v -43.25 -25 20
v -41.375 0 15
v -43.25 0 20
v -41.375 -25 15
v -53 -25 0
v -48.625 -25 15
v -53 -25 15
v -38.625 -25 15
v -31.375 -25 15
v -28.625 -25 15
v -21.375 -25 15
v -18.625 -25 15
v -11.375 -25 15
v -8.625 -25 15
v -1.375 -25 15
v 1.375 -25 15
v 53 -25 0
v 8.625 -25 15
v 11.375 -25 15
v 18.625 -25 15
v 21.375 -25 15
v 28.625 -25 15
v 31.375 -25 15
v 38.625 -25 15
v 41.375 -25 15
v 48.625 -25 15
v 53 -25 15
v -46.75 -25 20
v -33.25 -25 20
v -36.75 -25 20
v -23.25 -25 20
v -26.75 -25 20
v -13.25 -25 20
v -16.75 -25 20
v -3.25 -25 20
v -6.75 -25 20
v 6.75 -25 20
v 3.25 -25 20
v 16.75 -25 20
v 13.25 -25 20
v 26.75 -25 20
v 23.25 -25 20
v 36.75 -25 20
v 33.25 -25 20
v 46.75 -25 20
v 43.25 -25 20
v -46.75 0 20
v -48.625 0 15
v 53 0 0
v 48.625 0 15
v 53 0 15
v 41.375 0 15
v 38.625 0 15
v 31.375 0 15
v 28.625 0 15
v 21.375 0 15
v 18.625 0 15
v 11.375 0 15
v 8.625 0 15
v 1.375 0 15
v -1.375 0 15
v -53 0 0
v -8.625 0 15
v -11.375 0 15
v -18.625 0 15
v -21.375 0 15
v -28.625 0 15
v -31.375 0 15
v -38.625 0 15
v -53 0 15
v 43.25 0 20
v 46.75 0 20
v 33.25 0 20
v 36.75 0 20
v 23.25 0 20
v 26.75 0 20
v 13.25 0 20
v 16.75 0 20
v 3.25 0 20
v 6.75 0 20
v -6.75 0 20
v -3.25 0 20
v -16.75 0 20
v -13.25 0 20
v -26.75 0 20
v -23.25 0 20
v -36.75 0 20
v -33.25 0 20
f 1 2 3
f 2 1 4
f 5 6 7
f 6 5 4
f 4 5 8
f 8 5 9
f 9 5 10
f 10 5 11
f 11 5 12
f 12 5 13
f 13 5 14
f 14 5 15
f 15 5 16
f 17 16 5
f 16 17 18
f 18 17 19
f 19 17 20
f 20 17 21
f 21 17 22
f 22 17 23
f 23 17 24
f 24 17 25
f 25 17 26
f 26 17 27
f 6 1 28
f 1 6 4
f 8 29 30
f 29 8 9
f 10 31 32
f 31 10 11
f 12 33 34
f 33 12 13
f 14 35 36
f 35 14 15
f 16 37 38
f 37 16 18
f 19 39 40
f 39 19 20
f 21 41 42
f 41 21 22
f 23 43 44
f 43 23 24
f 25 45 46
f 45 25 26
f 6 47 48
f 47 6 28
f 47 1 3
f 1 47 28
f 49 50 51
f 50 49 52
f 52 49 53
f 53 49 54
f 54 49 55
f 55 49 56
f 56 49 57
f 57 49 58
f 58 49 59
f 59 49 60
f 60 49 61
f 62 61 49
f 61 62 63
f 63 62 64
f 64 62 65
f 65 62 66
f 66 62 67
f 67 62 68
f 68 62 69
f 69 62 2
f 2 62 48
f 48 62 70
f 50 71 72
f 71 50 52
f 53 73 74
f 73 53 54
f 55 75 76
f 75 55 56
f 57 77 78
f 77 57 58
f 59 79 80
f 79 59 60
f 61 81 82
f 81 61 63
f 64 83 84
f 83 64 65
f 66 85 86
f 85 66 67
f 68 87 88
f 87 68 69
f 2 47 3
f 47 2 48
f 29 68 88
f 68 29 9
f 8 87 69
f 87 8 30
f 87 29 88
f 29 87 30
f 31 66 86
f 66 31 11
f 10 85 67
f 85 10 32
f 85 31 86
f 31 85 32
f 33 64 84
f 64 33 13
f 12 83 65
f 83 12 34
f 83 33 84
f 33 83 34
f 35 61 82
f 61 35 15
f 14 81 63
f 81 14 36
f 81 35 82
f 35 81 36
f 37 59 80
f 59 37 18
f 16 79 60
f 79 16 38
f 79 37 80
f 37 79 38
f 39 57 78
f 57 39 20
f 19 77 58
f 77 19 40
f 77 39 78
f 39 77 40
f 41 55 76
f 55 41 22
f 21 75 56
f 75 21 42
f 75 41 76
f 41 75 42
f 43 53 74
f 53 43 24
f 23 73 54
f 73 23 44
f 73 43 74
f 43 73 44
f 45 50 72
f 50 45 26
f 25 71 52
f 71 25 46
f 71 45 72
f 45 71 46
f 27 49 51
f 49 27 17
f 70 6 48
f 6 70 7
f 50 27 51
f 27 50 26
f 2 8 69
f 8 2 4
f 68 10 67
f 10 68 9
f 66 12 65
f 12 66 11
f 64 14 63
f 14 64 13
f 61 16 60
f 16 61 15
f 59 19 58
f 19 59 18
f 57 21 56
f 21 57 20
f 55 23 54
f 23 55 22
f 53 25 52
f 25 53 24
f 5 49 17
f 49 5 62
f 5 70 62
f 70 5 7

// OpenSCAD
$fn = 32;

// ----------------------------------------------------------------------
// Toothed rack, 10 teeth
// 10 mm pitch, 5 mm teeth
// ----------------------------------------------------------------------

// --- parameters (mm) ---
bar_w = 25;     // bar width (Y)
bar_h = 15;     // bar height (Z)
teeth = 10;     // number of teeth
pitch = 10;     // tooth pitch
tooth_h = 5;    // tooth height above the bar
root_w = 8;     // tooth width at the root
crest_w = 3.5;  // tooth width at the crest

// --- derived feature positions (mm) ---
span = (teeth - 1) * pitch;  // = 90   distance between the outer teeth
bar_l = span + root_w + 8;   // = 106   bar length: teeth plus 4 mm at each end
tooth_x = -span / 2;         // = -45   X of the first tooth
height = bar_h + tooth_h;    // = 20   overall height
feature_centers = [
  [tooth_x + 0 * pitch, -bar_w / 2],
  [tooth_x + 1 * pitch, -bar_w / 2],
  [tooth_x + 2 * pitch, -bar_w / 2],
  [tooth_x + 3 * pitch, -bar_w / 2],
  [tooth_x + 4 * pitch, -bar_w / 2],
  [tooth_x + 5 * pitch, -bar_w / 2],
  [tooth_x + 6 * pitch, -bar_w / 2],
  [tooth_x + 7 * pitch, -bar_w / 2],
  [tooth_x + 8 * pitch, -bar_w / 2],
  [tooth_x + 9 * pitch, -bar_w / 2]
];   // tooth centre line, drives the tooth loop

// bar with a rack of teeth, one extruded trapezoium per centre
module rack_tooth() {
  linear_extrude(height = bar_w)
    polygon(points = [
      [0, 0],
      [root_w, 0],
      [root_w / 2 + crest_w / 2, tooth_h + 1],
      [root_w / 2 - crest_w / 2, tooth_h + 1]
    ]);
}

union() {
  translate([-bar_l / 2, -bar_w, 0]) cube([bar_l, bar_w, bar_h]);
  for (centre = feature_centers)
    translate([centre[0] - root_w / 2, 0, bar_h - 1]) rotate([90, 0, 0]) rack_tooth();
}
